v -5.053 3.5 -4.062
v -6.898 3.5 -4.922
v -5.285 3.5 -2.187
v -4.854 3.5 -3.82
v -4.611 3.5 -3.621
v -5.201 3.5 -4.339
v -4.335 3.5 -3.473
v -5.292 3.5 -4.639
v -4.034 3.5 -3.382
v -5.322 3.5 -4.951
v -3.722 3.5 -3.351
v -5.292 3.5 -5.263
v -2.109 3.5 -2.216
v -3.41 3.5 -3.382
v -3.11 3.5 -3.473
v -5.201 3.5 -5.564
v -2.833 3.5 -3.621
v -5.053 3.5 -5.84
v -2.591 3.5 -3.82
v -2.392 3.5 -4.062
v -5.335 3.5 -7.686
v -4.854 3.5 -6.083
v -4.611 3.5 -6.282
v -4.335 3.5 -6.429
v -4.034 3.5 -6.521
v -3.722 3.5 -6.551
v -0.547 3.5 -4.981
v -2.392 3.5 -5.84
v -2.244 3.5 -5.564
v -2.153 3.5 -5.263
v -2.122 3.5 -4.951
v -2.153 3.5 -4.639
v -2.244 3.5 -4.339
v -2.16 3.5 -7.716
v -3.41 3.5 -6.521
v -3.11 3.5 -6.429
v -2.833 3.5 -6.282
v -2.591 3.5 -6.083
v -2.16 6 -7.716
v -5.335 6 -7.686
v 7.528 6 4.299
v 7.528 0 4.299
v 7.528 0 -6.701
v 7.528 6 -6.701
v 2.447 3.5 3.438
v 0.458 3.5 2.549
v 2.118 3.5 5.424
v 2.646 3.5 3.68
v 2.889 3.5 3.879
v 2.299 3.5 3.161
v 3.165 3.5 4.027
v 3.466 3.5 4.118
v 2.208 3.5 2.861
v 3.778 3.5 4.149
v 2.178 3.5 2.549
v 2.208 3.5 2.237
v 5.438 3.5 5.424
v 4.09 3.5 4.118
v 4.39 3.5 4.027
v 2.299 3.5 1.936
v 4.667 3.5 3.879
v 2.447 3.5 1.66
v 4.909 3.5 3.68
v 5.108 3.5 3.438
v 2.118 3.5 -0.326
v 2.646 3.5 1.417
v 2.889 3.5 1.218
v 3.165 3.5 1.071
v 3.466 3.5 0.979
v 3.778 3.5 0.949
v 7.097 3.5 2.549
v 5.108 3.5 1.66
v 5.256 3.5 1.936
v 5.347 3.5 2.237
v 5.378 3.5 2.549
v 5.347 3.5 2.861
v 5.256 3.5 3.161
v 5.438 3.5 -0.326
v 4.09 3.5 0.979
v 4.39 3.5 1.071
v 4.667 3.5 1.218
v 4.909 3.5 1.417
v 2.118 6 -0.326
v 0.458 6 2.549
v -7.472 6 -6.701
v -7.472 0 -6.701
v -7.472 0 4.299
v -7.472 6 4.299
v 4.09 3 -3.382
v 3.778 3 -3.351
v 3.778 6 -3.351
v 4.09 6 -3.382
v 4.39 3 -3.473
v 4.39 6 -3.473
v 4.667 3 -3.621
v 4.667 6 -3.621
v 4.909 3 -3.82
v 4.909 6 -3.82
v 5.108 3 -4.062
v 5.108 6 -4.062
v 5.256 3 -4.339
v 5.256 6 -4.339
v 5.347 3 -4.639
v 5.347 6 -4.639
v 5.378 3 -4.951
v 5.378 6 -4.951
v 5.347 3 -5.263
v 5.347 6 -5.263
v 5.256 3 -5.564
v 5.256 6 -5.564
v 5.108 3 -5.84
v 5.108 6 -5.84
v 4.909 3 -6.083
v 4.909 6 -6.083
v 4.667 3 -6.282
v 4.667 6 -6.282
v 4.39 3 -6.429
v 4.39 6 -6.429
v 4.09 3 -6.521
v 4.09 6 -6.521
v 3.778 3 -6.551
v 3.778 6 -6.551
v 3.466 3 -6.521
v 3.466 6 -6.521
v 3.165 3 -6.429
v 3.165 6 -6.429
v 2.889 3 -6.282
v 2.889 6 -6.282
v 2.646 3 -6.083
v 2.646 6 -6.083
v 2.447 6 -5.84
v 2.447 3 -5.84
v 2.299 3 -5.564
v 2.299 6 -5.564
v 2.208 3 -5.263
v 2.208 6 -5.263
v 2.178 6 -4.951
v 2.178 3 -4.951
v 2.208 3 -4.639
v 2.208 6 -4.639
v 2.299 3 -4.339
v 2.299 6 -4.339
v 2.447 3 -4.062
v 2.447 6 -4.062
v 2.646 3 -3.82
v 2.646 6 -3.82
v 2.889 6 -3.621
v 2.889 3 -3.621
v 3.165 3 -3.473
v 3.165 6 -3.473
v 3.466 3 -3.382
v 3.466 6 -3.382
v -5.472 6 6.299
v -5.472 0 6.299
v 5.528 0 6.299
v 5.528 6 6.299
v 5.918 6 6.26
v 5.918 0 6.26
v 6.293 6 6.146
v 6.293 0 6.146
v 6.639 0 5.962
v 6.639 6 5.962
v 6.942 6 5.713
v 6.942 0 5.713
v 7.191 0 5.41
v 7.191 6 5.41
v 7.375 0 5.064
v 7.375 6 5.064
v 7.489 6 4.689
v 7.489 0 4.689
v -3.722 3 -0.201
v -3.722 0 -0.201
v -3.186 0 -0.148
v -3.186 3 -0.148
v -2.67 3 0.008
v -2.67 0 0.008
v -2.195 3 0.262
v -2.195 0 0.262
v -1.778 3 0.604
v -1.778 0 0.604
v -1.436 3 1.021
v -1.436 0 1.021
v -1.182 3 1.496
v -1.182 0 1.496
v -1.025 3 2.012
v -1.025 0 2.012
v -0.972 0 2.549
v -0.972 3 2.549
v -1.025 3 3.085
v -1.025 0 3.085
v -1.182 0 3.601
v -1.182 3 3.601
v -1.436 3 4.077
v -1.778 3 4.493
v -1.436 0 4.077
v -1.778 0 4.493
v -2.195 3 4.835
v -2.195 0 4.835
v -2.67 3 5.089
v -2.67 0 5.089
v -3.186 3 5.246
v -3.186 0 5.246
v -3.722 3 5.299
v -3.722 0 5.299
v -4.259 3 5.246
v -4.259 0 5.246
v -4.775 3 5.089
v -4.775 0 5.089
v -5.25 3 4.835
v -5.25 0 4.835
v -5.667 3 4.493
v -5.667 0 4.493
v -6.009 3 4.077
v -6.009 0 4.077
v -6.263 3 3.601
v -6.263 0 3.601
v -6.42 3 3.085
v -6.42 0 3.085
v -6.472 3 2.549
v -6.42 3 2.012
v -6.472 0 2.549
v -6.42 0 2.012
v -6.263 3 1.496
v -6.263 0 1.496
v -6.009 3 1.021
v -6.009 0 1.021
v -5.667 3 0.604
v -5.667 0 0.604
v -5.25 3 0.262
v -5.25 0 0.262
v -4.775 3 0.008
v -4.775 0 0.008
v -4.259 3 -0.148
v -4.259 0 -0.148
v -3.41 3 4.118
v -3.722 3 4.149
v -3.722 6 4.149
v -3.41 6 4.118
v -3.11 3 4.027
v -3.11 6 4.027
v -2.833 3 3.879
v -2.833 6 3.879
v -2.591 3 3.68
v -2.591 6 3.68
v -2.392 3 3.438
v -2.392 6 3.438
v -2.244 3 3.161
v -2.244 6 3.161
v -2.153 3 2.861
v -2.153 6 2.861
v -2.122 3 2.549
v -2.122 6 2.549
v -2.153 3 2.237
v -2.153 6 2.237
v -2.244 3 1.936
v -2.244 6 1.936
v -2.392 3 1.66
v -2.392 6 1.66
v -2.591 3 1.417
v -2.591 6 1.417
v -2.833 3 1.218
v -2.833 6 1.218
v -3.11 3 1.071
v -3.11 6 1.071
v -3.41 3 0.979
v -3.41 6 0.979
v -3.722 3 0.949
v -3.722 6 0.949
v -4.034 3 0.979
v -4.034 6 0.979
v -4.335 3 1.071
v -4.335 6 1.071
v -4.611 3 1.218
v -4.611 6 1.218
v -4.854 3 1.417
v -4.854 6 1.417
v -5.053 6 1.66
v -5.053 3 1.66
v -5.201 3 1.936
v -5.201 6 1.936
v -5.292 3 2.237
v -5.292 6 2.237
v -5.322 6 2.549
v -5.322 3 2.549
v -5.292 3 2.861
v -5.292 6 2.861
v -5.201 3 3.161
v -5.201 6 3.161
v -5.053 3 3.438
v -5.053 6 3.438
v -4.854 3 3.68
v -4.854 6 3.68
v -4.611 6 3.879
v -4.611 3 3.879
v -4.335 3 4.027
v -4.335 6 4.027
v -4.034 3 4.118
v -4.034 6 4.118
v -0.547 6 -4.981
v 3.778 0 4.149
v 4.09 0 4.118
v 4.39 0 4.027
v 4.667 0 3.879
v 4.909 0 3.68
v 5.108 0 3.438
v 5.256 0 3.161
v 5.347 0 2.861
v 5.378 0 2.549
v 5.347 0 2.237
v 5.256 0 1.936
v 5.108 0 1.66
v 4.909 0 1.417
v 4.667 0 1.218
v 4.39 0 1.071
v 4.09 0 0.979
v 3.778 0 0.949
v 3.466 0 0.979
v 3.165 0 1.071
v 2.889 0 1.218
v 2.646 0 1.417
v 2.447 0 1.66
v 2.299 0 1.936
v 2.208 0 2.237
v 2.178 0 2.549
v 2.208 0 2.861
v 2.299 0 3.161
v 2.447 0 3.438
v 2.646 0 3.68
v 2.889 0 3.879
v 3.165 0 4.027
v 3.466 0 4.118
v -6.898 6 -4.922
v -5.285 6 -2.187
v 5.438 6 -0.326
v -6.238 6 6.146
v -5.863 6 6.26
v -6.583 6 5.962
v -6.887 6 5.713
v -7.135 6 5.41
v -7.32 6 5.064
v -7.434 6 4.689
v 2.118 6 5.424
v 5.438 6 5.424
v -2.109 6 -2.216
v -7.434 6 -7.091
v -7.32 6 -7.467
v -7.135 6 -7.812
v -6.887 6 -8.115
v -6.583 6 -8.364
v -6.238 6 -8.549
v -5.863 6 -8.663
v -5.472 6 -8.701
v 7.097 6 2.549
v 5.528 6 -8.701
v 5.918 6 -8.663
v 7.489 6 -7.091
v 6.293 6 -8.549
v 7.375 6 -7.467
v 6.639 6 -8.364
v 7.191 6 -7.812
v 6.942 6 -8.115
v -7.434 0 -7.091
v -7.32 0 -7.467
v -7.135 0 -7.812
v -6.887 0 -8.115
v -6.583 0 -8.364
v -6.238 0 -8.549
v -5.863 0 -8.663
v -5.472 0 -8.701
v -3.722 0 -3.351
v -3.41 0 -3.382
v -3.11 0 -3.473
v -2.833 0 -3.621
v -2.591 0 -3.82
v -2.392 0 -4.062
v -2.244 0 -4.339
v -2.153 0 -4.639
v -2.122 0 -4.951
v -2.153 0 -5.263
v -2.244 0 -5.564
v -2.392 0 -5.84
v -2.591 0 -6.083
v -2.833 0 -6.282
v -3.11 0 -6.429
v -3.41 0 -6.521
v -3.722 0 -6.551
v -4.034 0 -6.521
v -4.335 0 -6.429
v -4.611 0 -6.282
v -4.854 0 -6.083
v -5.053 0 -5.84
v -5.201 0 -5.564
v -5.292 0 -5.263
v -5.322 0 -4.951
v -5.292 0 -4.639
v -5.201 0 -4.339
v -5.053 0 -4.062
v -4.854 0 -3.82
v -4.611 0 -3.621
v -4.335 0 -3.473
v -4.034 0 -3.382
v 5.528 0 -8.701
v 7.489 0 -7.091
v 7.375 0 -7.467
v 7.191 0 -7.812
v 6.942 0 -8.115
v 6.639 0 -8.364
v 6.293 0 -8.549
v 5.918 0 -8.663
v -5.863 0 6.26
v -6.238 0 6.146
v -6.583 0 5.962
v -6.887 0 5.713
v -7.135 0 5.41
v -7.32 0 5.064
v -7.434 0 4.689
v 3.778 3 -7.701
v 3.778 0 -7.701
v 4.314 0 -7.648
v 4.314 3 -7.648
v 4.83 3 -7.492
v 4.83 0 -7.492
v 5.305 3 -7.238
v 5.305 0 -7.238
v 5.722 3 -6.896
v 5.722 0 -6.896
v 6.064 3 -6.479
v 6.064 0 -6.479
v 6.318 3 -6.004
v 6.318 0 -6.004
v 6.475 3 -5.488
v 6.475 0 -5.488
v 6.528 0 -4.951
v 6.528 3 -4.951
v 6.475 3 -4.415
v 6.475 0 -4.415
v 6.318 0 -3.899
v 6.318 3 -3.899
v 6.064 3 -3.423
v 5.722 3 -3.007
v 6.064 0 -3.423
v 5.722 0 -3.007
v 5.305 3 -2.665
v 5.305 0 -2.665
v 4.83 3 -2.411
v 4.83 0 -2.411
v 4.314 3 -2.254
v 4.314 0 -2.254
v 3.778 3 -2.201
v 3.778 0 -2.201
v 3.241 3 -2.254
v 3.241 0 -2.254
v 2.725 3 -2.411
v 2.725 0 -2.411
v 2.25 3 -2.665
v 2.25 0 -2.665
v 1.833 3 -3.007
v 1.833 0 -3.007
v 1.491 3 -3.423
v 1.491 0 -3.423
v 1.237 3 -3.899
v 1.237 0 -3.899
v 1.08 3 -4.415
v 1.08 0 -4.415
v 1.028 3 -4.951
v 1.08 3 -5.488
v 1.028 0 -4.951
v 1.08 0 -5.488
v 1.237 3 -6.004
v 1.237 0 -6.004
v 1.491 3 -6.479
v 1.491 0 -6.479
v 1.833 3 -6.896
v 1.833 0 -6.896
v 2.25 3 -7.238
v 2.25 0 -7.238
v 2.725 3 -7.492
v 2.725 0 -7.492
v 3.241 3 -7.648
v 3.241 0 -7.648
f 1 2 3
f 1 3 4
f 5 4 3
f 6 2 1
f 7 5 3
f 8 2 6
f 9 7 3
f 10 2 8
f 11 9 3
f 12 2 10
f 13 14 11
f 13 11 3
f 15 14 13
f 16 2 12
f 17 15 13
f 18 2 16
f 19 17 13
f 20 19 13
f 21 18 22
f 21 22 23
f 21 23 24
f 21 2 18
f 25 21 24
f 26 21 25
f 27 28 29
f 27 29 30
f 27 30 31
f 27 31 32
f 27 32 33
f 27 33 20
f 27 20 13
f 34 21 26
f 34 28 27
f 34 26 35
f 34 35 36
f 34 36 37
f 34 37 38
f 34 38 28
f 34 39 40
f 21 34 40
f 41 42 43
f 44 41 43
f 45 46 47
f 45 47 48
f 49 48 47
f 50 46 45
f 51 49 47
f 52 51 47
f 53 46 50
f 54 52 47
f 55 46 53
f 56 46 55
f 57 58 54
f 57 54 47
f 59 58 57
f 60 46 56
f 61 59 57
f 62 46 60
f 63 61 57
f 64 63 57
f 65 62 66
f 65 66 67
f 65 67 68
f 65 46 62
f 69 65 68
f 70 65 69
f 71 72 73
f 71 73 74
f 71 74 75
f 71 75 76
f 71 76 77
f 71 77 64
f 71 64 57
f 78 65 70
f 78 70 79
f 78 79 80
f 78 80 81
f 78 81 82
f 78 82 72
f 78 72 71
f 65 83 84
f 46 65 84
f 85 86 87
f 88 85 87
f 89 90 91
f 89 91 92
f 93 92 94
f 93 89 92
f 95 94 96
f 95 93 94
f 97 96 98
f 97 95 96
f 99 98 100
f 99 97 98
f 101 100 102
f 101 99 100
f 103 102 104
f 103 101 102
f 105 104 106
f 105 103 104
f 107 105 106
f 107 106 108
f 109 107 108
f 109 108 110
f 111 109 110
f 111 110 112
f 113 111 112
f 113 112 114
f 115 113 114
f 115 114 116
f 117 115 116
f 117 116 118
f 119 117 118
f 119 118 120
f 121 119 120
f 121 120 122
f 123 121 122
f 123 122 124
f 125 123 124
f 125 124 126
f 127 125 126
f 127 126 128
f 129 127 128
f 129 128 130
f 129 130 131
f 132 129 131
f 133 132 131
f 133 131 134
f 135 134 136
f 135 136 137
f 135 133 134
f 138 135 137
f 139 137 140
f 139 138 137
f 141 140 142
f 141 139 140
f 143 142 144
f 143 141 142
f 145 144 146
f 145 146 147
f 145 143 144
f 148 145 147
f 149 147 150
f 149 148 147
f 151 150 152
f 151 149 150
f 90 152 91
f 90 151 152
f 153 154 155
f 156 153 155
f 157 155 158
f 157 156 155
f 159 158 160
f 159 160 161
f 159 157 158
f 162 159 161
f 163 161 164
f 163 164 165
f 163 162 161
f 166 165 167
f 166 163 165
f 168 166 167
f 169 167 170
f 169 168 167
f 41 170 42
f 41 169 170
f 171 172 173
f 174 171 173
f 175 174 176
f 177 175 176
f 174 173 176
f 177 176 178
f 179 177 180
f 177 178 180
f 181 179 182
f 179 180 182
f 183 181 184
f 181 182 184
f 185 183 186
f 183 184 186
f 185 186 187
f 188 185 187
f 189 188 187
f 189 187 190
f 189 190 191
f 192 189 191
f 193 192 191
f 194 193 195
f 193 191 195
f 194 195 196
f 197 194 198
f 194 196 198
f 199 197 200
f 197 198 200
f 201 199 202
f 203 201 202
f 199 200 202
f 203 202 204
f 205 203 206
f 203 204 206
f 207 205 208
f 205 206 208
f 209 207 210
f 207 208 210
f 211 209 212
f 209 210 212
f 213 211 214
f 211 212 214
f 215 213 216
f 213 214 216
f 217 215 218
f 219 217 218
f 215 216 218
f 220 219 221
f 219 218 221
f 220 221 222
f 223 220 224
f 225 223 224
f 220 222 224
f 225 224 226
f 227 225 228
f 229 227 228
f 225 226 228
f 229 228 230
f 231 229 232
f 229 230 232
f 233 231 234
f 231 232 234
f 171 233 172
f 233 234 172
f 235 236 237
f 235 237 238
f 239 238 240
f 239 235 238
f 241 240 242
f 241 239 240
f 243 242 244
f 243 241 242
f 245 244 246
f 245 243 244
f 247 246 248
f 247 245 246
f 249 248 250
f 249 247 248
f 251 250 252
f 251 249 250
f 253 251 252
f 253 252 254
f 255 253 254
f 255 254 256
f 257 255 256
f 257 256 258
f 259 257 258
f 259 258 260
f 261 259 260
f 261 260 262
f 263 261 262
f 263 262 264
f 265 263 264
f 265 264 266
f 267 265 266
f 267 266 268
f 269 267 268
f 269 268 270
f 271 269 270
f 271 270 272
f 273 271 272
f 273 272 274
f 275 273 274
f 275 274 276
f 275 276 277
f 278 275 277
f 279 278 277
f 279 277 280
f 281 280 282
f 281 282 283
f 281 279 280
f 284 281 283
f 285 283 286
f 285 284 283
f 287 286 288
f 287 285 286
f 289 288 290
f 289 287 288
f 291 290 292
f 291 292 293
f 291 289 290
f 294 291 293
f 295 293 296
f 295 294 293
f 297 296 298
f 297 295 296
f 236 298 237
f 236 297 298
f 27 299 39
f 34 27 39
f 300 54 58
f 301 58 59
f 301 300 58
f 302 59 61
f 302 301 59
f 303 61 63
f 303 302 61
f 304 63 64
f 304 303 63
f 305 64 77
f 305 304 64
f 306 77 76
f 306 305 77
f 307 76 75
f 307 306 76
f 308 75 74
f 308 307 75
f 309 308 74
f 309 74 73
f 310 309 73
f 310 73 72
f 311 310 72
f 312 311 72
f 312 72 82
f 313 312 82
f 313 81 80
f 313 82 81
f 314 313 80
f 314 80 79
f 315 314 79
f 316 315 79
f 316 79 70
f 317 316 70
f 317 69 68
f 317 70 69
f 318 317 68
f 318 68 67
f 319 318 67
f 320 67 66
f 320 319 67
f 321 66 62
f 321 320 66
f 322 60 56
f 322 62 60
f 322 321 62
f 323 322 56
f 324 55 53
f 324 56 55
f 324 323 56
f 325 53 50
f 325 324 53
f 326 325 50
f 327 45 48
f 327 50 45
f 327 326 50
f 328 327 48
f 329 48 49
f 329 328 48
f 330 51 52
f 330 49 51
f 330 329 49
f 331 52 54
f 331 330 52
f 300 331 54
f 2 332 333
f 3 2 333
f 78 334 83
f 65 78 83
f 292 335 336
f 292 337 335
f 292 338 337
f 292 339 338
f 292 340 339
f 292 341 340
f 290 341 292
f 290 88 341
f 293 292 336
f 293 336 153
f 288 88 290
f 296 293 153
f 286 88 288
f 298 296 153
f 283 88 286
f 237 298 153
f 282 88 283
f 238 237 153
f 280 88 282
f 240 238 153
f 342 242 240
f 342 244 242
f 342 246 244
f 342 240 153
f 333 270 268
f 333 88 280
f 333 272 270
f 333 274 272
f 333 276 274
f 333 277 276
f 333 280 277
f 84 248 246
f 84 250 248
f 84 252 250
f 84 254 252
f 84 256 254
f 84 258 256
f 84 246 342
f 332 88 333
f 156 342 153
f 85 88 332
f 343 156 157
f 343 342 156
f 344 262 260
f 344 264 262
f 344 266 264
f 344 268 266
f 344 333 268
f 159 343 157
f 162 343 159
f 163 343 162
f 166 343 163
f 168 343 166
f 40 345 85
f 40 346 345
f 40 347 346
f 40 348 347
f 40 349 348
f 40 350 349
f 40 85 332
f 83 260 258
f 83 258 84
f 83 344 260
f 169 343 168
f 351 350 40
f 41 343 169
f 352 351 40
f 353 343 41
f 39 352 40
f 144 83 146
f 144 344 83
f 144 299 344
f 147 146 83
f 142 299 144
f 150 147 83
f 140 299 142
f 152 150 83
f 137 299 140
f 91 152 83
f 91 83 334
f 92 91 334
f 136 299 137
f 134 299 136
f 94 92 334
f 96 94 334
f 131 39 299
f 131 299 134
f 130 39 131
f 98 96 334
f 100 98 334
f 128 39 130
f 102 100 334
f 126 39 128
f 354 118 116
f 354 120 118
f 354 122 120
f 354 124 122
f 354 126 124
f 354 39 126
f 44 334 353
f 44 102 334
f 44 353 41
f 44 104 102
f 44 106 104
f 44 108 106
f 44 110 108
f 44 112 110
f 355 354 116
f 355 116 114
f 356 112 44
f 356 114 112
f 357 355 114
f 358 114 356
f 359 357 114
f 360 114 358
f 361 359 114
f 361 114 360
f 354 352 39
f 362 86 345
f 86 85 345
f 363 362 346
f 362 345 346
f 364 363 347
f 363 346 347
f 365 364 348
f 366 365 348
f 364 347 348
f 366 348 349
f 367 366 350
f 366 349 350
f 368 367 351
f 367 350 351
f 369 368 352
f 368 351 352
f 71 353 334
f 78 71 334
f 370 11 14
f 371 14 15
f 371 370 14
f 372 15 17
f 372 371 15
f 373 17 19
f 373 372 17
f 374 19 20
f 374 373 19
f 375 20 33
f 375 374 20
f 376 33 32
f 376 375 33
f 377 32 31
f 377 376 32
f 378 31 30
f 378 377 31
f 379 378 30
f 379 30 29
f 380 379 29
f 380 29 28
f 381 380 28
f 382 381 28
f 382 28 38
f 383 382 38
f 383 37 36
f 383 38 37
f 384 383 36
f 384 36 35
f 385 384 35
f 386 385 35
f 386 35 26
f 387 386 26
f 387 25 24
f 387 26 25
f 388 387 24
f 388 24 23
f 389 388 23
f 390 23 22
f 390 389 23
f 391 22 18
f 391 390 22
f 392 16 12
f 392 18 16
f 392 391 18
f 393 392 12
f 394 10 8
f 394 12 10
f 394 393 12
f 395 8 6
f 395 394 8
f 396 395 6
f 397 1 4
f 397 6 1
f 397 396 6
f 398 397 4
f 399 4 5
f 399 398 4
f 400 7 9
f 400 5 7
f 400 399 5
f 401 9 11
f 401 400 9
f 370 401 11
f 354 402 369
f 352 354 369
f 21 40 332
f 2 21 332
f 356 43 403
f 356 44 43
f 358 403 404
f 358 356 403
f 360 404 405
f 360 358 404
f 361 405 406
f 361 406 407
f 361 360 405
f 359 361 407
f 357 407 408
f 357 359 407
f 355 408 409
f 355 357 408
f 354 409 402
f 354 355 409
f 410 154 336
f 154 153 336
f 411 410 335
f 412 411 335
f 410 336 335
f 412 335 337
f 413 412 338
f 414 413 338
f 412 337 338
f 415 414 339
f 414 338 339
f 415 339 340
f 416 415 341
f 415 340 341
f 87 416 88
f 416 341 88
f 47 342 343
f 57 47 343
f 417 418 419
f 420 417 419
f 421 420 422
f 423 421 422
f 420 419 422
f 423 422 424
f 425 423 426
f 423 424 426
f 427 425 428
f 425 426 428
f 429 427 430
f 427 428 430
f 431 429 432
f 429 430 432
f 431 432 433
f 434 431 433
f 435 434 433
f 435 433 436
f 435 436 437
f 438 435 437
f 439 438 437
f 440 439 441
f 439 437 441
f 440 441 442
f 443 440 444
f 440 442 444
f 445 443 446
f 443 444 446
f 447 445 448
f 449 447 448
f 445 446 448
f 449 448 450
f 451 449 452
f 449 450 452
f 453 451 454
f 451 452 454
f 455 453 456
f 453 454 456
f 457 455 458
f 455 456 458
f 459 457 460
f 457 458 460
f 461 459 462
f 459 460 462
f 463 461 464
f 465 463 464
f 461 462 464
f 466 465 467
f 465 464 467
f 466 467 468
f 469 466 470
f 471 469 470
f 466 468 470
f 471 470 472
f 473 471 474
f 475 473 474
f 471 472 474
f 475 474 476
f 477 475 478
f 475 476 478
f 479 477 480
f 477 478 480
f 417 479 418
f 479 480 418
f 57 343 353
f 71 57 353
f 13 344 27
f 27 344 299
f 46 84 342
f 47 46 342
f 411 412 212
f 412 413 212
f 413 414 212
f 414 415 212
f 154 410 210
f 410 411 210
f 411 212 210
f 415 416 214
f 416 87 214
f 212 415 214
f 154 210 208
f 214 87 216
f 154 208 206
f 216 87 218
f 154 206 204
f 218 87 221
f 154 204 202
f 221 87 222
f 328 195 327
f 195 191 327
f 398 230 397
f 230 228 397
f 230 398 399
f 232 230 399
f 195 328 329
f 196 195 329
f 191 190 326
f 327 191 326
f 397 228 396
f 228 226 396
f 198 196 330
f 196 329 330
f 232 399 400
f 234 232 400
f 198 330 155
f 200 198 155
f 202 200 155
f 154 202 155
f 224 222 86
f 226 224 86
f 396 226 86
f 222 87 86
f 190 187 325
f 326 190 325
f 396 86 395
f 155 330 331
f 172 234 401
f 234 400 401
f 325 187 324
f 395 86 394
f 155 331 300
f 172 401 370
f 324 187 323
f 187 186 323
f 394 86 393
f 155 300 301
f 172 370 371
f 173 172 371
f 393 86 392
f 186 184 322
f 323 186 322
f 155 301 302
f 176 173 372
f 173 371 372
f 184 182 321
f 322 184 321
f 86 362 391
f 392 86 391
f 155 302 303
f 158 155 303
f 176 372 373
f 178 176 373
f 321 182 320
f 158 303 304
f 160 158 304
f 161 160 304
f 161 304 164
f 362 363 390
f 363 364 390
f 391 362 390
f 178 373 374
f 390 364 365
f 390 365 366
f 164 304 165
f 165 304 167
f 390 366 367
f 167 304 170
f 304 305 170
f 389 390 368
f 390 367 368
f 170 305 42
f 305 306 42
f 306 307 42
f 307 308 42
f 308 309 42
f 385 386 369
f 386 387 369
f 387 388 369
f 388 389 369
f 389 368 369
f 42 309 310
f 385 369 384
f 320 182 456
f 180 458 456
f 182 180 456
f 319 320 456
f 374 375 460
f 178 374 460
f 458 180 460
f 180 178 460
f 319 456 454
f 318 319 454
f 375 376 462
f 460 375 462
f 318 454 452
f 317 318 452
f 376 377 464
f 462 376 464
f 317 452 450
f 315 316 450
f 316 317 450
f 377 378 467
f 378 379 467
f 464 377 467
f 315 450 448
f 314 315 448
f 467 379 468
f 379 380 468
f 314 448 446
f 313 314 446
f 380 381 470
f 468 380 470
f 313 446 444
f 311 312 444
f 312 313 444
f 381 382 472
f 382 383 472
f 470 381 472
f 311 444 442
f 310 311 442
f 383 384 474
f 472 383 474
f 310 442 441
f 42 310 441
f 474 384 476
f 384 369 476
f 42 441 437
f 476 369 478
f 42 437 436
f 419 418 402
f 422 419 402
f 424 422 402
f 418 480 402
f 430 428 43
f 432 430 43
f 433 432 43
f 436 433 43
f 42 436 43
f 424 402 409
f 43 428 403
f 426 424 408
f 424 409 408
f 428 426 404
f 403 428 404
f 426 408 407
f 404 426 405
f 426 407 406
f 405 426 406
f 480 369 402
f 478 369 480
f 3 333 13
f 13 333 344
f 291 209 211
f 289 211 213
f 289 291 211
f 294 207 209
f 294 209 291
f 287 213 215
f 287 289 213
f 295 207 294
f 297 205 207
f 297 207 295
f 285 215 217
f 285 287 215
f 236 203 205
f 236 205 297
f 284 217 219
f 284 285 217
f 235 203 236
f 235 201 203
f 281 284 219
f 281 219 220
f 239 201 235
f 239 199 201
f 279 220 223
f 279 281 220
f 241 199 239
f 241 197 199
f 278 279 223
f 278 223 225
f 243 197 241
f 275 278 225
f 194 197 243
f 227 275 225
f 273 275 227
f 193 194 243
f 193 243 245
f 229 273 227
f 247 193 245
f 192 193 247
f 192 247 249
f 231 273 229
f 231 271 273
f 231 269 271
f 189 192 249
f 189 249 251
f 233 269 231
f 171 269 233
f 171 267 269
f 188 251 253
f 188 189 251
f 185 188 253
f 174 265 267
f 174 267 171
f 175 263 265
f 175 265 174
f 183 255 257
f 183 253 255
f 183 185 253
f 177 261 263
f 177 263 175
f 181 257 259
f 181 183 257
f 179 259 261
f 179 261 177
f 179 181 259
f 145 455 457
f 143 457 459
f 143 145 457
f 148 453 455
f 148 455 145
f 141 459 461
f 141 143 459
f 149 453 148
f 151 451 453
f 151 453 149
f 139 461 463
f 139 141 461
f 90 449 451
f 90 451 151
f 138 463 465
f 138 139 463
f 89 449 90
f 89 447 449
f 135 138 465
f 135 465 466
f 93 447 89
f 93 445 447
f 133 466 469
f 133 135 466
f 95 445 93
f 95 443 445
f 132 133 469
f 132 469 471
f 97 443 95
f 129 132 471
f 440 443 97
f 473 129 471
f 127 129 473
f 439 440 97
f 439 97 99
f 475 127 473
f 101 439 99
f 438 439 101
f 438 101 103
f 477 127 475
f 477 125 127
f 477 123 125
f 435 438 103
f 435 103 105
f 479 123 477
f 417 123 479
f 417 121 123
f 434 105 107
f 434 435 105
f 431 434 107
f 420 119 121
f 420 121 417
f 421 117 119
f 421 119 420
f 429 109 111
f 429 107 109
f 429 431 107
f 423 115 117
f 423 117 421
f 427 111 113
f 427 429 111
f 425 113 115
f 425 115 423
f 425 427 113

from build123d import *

# Parameters (mm, degrees)
SKETCH1_R           = 1.6
BOSS_EXTRUDE1_DEPTH = 6
CUT_EXTRUDE1_DEPTH  = 2.5
SKETCH3_R           = 2.75
CUT_EXTRUDE2_DEPTH  = 3
FILLET1_R           = 2


with BuildPart() as part:
    # Sketch1 → Boss-Extrude1 (new body)
    with BuildSketch(Plane(origin=(0, 0, 0), x_dir=(1, 0, 0), z_dir=(0, 1, 0))):
        Polygon((-7.472353521, 4.877749034), (-7.472353521, -6.298721554), (7.527646479, -6.298721554), (7.527646479, 8.701278446), (-7.472353521, 8.701278446), align=None)
        with Locations(Location((-3.722353521, 4.951278446, 0), (0, 0, 270))):
            Circle(SKETCH1_R, mode=Mode.SUBTRACT)
        with Locations(Location((3.777646479, -2.548721554, 0), (0, 0, 270))):
            Circle(SKETCH1_R, mode=Mode.SUBTRACT)
        with Locations(Location((3.777646479, 4.951278446, 0), (0, 0, 270))):
            Circle(SKETCH1_R, mode=Mode.SUBTRACT)
        with Locations(Location((-3.722353521, -2.548721554, 0), (0, 0, 270))):
            Circle(SKETCH1_R, mode=Mode.SUBTRACT)
    extrude(amount=BOSS_EXTRUDE1_DEPTH)

    # Sketch2 → Cut-Extrude1 (cut)
    with BuildSketch(Plane(origin=(0, 6, 0), x_dir=(1, 0, 0), z_dir=(0, 1, 0))):
        Polygon((-2.109264929, 2.216085852), (-0.547062955, 4.980657848), (-2.160151547, 7.715850442), (-5.335442114, 7.686471039), (-6.897644088, 4.921899043), (-5.284555496, 2.186706449), align=None)
        Polygon((7.097410526, -2.548721554), (5.437528503, 0.326278446), (2.117764455, 0.326278446), (0.457882431, -2.548721554), (2.117764455, -5.423721554), (5.437528503, -5.423721554), align=None)
    extrude(amount=-CUT_EXTRUDE1_DEPTH, mode=Mode.SUBTRACT)

    # Sketch3 → Cut-Extrude2 (cut)
    with BuildSketch(Plane.XZ):
        with Locations(Location((3.777646479, -4.951278446, 0), (0, 0, 270))):
            Circle(SKETCH3_R)
        with Locations(Location((-3.722353521, 2.548721554, 0), (0, 0, 270))):
            Circle(SKETCH3_R)
    extrude(amount=-CUT_EXTRUDE2_DEPTH, mode=Mode.SUBTRACT)

    # Fillet1
    fillet1_edges = [part.edges().sort_by_distance(p)[0] for p in [
        (-7.472353521, 3, -8.701278446),
        (7.527646479, 3, -8.701278446),
        (7.527646479, 3, 6.298721554),
        (-7.472353521, 3, 6.298721554),
    ]]
    fillet(fillet1_edges, radius=FILLET1_R)


solid = part.part
